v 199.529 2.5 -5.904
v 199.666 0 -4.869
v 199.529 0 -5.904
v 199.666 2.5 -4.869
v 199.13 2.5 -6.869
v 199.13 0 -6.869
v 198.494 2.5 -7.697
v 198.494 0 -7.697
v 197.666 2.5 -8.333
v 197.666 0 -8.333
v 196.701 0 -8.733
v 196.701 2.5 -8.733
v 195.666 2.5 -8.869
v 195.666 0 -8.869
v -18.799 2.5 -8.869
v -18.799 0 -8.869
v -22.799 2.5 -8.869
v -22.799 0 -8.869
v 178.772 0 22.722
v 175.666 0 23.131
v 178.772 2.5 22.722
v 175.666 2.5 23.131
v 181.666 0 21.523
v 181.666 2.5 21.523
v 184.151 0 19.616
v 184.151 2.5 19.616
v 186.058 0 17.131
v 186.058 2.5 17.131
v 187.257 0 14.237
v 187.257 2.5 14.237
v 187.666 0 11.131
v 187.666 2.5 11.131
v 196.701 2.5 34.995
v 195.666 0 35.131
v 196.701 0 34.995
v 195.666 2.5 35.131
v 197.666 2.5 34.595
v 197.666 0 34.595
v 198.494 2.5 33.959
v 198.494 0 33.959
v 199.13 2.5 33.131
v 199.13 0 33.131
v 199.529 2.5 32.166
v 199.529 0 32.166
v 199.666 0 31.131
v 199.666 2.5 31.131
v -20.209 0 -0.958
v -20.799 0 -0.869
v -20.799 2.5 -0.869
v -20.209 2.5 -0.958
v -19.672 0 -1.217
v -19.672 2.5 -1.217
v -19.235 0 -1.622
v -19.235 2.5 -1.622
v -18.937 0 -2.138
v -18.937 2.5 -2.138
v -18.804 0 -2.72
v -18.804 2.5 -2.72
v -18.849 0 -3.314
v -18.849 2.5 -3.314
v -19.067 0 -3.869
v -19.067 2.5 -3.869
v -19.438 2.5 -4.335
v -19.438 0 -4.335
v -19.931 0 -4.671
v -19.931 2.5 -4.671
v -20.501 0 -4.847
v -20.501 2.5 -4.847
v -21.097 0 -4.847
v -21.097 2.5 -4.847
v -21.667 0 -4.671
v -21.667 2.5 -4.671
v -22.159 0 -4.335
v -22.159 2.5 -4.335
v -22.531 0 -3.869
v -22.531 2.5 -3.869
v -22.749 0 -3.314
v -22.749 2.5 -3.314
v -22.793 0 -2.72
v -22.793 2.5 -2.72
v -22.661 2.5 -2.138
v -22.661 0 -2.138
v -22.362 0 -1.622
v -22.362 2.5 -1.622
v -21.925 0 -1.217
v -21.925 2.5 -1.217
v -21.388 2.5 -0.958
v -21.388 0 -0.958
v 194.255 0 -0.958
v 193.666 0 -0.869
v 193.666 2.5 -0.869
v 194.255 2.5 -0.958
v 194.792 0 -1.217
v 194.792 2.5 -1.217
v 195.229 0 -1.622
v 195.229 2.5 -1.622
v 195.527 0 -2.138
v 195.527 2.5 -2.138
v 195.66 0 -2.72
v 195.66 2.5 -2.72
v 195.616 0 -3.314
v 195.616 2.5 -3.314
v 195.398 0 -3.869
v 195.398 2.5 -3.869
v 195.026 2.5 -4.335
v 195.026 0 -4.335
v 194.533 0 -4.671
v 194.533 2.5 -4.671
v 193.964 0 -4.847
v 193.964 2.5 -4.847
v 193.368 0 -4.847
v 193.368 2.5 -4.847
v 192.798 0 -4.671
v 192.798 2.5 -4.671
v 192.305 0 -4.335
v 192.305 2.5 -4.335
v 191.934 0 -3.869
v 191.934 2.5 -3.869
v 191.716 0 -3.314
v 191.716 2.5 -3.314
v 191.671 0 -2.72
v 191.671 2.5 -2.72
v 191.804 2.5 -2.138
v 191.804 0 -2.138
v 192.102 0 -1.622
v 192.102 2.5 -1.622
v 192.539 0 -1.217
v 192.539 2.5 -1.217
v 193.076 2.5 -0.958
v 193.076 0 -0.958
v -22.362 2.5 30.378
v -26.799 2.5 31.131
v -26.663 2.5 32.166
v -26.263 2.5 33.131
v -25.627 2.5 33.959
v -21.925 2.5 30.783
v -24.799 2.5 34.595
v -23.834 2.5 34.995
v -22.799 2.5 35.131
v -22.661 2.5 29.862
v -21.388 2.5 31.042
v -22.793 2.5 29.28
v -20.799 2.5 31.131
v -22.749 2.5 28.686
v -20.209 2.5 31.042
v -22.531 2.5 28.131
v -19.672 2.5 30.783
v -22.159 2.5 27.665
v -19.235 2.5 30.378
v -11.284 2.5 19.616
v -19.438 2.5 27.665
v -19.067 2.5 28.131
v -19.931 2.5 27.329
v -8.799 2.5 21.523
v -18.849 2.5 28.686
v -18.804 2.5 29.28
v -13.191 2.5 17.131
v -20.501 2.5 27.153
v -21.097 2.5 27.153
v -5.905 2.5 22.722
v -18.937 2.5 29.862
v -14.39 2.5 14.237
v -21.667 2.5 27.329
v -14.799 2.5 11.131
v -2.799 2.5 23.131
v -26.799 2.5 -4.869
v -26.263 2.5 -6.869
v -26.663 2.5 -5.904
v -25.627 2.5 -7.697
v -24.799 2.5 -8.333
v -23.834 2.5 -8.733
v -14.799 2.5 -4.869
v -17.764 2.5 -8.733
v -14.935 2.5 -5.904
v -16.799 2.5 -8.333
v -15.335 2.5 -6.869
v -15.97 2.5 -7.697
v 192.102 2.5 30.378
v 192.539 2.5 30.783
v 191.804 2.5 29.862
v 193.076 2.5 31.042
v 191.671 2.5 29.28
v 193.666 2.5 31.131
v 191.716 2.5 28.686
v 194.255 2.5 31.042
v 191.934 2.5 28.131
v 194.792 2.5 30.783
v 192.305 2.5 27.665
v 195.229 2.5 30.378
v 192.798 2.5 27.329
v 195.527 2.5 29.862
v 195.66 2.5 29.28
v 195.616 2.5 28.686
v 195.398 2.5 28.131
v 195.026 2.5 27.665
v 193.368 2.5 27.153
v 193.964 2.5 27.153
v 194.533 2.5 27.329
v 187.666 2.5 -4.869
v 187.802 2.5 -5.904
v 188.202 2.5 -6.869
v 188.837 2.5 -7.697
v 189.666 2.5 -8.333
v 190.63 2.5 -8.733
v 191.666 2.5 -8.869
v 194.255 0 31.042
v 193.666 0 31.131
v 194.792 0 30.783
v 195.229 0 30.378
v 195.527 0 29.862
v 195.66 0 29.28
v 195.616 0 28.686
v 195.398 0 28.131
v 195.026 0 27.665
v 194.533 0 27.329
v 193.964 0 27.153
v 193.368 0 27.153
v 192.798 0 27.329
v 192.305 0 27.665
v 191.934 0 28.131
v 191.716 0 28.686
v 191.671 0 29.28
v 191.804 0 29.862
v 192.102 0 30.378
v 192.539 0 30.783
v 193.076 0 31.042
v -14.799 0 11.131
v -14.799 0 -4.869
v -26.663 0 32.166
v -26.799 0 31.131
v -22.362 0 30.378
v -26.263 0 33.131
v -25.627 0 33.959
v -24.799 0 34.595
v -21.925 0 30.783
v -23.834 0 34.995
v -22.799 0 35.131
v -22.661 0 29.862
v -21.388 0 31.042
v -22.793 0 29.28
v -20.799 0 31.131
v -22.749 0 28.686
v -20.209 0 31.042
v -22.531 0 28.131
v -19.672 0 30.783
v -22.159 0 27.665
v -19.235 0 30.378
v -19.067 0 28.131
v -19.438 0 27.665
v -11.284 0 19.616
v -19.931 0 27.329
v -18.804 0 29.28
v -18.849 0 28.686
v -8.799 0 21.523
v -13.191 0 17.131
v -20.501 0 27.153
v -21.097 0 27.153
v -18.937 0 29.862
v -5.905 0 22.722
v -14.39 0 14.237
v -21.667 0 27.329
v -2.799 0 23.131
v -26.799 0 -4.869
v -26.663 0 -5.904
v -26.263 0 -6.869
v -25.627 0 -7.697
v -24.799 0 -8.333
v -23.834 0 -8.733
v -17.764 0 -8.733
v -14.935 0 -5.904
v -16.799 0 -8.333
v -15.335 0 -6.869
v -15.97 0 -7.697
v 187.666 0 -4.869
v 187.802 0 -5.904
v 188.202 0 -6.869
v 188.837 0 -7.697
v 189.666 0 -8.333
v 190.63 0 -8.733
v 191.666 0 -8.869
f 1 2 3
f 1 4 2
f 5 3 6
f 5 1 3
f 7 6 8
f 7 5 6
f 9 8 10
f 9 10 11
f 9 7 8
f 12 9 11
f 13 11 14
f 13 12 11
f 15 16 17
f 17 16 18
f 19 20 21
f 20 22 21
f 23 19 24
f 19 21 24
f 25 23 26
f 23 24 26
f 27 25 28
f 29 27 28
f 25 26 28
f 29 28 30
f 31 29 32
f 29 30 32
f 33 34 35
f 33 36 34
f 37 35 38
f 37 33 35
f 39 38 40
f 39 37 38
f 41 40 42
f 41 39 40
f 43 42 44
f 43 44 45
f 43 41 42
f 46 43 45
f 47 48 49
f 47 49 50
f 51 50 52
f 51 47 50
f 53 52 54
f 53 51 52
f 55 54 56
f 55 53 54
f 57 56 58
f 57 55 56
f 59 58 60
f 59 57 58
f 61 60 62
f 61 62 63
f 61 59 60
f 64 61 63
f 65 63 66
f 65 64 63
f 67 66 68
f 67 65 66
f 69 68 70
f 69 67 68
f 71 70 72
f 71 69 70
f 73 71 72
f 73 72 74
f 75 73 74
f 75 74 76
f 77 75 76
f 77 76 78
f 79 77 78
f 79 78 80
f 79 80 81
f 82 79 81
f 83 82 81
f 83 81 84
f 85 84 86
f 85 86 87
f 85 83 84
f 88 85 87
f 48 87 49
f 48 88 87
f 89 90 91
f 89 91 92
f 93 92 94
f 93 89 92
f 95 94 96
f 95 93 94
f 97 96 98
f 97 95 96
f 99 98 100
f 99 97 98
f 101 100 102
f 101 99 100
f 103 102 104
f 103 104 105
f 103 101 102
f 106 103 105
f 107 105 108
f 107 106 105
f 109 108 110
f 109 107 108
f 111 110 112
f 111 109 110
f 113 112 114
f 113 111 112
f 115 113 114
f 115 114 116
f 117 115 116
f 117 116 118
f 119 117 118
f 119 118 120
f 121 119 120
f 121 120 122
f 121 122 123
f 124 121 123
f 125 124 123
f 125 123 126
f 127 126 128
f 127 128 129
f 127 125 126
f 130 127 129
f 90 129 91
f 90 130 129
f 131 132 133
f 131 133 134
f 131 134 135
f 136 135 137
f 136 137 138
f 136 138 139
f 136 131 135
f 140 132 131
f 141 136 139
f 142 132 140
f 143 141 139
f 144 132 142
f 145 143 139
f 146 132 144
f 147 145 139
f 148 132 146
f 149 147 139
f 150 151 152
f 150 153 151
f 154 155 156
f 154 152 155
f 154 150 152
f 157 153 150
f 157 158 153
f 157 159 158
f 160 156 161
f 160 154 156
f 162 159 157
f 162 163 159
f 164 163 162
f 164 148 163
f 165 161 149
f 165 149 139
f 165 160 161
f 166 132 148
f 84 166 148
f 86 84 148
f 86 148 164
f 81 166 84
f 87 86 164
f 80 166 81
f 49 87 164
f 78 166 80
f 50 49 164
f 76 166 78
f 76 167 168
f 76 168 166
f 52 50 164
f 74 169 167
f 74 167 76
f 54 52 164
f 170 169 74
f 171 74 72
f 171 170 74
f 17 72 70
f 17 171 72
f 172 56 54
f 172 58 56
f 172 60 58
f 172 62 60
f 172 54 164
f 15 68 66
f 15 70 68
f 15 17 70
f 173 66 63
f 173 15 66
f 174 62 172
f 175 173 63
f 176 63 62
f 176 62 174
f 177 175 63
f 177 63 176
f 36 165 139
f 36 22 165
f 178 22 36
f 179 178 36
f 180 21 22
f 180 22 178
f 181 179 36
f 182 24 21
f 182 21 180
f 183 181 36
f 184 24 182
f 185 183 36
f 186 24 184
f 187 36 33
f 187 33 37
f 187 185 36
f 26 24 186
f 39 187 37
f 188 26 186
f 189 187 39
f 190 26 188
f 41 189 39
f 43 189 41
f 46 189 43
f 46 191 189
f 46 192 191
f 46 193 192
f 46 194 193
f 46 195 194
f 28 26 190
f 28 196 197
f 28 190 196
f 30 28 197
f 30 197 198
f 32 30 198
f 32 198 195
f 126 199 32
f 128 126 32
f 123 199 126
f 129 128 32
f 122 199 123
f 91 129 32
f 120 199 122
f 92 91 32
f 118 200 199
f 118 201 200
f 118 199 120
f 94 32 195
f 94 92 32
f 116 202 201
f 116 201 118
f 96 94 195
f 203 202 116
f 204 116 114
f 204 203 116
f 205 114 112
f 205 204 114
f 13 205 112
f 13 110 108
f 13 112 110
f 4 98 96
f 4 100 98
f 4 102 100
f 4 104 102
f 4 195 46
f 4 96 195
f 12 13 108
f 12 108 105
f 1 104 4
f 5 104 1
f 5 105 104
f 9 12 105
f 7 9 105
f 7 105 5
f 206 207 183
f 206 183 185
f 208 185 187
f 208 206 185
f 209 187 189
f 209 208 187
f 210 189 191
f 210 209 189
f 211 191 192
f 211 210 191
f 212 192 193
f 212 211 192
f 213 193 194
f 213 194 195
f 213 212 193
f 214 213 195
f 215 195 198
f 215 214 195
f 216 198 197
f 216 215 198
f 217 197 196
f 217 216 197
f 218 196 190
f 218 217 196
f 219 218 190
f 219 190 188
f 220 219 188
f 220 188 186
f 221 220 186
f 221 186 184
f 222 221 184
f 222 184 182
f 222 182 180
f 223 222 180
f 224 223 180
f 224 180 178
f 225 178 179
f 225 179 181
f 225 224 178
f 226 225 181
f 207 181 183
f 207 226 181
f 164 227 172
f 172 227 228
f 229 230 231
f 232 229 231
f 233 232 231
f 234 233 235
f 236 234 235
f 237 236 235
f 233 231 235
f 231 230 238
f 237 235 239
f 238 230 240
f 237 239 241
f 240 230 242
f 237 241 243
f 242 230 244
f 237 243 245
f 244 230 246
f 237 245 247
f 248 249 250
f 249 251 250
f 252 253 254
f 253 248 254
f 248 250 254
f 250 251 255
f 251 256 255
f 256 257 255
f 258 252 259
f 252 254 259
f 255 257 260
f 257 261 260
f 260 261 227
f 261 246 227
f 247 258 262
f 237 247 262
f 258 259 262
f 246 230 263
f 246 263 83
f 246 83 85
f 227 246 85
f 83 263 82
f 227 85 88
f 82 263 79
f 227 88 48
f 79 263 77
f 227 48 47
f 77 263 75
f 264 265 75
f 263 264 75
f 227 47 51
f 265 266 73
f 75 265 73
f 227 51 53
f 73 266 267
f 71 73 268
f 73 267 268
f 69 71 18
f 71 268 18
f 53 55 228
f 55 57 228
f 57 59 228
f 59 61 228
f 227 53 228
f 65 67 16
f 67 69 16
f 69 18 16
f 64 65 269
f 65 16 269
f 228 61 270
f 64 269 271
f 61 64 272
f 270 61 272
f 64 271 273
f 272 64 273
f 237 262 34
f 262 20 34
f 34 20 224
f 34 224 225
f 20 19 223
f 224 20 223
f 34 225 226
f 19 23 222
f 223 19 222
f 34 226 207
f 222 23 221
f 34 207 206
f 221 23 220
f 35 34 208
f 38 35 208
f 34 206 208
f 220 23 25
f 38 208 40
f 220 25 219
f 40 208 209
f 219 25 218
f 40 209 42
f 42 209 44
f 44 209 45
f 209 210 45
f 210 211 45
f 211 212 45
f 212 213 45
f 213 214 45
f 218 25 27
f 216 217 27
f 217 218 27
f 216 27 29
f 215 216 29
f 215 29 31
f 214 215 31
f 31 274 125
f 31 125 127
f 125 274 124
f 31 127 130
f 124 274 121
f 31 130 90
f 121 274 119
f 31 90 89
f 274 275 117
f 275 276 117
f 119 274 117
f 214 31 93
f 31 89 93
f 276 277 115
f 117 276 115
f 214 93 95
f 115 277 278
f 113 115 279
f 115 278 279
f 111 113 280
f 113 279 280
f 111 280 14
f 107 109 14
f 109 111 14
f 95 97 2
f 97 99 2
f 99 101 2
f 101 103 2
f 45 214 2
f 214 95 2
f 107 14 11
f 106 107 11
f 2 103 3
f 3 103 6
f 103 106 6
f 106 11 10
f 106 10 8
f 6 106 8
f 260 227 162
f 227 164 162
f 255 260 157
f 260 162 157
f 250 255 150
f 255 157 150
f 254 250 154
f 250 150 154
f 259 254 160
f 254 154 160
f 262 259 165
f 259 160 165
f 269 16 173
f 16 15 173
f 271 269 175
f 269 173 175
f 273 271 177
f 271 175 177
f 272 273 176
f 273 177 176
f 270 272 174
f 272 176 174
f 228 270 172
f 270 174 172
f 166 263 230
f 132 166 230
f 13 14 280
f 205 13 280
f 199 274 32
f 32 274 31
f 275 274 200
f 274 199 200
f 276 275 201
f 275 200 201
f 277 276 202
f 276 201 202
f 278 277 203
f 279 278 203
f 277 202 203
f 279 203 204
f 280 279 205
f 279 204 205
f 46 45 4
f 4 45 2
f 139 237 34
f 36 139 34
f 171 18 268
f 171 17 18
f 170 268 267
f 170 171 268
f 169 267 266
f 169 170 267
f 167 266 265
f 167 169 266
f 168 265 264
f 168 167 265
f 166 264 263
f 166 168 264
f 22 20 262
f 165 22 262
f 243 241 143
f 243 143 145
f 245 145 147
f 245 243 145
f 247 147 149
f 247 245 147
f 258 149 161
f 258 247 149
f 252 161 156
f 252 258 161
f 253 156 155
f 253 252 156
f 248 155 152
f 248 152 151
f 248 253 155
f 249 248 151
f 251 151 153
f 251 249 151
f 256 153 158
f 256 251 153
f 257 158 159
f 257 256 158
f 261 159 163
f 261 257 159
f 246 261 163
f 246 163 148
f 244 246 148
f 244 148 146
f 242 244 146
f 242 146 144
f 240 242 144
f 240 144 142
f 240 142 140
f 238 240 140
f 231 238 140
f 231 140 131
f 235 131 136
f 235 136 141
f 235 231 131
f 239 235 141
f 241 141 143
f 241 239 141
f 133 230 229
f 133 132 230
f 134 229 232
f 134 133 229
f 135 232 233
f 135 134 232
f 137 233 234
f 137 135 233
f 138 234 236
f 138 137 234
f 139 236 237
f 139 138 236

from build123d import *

# Parameters (mm, degrees)
SKETCH1_R           = 2
BOSS_EXTRUDE1_DEPTH = 2.5
FILLET1_R           = 4
FILLET3_R           = 12


with BuildPart() as part:
    # Sketch1 → Boss-Extrude1 (new body)
    with BuildSketch(Plane(origin=(0, 0, 0), x_dir=(1, 0, 0), z_dir=(0, 1, 0))):
        Polygon((-14.798836476, 8.869056619), (-26.798836476, 8.869056619), (-26.798836476, -35.130943381), (199.665714924, -35.130943381), (199.665714924, 8.869056619), (187.665714924, 8.869056619), (187.665714924, -23.130943381), (-14.798836476, -23.130943381), align=None)
        with Locations(Location((-20.798836476, 2.869056619, 0), (0, 0, 270))):
            Circle(SKETCH1_R, mode=Mode.SUBTRACT)
        with Locations(Location((-20.798836476, -29.130943381, 0), (0, 0, 270))):
            Circle(SKETCH1_R, mode=Mode.SUBTRACT)
        with Locations(Location((193.665714924, 2.869056619, 0), (0, 0, 270))):
            Circle(SKETCH1_R, mode=Mode.SUBTRACT)
        with Locations(Location((193.665714924, -29.130943381, 0), (0, 0, 270))):
            Circle(SKETCH1_R, mode=Mode.SUBTRACT)
    extrude(amount=BOSS_EXTRUDE1_DEPTH)

    # Fillet1
    fillet1_edges = [part.edges().sort_by_distance(p)[0] for p in [
        (-26.798836476, 1.25, -8.869056619),
        (-14.798836476, 1.25, -8.869056619),
        (187.665714924, 1.25, -8.869056619),
        (199.665714924, 1.25, -8.869056619),
        (199.665714924, 1.25, 35.130943381),
        (-26.798836476, 1.25, 35.130943381),
    ]]
    fillet(fillet1_edges, radius=FILLET1_R)

    # Fillet3
    fillet3_edges = [part.edges().sort_by_distance(p)[0] for p in [
        (-14.798836476, 1.25, 23.130943381),
        (187.665714924, 1.25, 23.130943381),
    ]]
    fillet(fillet3_edges, radius=FILLET3_R)


solid = part.part
